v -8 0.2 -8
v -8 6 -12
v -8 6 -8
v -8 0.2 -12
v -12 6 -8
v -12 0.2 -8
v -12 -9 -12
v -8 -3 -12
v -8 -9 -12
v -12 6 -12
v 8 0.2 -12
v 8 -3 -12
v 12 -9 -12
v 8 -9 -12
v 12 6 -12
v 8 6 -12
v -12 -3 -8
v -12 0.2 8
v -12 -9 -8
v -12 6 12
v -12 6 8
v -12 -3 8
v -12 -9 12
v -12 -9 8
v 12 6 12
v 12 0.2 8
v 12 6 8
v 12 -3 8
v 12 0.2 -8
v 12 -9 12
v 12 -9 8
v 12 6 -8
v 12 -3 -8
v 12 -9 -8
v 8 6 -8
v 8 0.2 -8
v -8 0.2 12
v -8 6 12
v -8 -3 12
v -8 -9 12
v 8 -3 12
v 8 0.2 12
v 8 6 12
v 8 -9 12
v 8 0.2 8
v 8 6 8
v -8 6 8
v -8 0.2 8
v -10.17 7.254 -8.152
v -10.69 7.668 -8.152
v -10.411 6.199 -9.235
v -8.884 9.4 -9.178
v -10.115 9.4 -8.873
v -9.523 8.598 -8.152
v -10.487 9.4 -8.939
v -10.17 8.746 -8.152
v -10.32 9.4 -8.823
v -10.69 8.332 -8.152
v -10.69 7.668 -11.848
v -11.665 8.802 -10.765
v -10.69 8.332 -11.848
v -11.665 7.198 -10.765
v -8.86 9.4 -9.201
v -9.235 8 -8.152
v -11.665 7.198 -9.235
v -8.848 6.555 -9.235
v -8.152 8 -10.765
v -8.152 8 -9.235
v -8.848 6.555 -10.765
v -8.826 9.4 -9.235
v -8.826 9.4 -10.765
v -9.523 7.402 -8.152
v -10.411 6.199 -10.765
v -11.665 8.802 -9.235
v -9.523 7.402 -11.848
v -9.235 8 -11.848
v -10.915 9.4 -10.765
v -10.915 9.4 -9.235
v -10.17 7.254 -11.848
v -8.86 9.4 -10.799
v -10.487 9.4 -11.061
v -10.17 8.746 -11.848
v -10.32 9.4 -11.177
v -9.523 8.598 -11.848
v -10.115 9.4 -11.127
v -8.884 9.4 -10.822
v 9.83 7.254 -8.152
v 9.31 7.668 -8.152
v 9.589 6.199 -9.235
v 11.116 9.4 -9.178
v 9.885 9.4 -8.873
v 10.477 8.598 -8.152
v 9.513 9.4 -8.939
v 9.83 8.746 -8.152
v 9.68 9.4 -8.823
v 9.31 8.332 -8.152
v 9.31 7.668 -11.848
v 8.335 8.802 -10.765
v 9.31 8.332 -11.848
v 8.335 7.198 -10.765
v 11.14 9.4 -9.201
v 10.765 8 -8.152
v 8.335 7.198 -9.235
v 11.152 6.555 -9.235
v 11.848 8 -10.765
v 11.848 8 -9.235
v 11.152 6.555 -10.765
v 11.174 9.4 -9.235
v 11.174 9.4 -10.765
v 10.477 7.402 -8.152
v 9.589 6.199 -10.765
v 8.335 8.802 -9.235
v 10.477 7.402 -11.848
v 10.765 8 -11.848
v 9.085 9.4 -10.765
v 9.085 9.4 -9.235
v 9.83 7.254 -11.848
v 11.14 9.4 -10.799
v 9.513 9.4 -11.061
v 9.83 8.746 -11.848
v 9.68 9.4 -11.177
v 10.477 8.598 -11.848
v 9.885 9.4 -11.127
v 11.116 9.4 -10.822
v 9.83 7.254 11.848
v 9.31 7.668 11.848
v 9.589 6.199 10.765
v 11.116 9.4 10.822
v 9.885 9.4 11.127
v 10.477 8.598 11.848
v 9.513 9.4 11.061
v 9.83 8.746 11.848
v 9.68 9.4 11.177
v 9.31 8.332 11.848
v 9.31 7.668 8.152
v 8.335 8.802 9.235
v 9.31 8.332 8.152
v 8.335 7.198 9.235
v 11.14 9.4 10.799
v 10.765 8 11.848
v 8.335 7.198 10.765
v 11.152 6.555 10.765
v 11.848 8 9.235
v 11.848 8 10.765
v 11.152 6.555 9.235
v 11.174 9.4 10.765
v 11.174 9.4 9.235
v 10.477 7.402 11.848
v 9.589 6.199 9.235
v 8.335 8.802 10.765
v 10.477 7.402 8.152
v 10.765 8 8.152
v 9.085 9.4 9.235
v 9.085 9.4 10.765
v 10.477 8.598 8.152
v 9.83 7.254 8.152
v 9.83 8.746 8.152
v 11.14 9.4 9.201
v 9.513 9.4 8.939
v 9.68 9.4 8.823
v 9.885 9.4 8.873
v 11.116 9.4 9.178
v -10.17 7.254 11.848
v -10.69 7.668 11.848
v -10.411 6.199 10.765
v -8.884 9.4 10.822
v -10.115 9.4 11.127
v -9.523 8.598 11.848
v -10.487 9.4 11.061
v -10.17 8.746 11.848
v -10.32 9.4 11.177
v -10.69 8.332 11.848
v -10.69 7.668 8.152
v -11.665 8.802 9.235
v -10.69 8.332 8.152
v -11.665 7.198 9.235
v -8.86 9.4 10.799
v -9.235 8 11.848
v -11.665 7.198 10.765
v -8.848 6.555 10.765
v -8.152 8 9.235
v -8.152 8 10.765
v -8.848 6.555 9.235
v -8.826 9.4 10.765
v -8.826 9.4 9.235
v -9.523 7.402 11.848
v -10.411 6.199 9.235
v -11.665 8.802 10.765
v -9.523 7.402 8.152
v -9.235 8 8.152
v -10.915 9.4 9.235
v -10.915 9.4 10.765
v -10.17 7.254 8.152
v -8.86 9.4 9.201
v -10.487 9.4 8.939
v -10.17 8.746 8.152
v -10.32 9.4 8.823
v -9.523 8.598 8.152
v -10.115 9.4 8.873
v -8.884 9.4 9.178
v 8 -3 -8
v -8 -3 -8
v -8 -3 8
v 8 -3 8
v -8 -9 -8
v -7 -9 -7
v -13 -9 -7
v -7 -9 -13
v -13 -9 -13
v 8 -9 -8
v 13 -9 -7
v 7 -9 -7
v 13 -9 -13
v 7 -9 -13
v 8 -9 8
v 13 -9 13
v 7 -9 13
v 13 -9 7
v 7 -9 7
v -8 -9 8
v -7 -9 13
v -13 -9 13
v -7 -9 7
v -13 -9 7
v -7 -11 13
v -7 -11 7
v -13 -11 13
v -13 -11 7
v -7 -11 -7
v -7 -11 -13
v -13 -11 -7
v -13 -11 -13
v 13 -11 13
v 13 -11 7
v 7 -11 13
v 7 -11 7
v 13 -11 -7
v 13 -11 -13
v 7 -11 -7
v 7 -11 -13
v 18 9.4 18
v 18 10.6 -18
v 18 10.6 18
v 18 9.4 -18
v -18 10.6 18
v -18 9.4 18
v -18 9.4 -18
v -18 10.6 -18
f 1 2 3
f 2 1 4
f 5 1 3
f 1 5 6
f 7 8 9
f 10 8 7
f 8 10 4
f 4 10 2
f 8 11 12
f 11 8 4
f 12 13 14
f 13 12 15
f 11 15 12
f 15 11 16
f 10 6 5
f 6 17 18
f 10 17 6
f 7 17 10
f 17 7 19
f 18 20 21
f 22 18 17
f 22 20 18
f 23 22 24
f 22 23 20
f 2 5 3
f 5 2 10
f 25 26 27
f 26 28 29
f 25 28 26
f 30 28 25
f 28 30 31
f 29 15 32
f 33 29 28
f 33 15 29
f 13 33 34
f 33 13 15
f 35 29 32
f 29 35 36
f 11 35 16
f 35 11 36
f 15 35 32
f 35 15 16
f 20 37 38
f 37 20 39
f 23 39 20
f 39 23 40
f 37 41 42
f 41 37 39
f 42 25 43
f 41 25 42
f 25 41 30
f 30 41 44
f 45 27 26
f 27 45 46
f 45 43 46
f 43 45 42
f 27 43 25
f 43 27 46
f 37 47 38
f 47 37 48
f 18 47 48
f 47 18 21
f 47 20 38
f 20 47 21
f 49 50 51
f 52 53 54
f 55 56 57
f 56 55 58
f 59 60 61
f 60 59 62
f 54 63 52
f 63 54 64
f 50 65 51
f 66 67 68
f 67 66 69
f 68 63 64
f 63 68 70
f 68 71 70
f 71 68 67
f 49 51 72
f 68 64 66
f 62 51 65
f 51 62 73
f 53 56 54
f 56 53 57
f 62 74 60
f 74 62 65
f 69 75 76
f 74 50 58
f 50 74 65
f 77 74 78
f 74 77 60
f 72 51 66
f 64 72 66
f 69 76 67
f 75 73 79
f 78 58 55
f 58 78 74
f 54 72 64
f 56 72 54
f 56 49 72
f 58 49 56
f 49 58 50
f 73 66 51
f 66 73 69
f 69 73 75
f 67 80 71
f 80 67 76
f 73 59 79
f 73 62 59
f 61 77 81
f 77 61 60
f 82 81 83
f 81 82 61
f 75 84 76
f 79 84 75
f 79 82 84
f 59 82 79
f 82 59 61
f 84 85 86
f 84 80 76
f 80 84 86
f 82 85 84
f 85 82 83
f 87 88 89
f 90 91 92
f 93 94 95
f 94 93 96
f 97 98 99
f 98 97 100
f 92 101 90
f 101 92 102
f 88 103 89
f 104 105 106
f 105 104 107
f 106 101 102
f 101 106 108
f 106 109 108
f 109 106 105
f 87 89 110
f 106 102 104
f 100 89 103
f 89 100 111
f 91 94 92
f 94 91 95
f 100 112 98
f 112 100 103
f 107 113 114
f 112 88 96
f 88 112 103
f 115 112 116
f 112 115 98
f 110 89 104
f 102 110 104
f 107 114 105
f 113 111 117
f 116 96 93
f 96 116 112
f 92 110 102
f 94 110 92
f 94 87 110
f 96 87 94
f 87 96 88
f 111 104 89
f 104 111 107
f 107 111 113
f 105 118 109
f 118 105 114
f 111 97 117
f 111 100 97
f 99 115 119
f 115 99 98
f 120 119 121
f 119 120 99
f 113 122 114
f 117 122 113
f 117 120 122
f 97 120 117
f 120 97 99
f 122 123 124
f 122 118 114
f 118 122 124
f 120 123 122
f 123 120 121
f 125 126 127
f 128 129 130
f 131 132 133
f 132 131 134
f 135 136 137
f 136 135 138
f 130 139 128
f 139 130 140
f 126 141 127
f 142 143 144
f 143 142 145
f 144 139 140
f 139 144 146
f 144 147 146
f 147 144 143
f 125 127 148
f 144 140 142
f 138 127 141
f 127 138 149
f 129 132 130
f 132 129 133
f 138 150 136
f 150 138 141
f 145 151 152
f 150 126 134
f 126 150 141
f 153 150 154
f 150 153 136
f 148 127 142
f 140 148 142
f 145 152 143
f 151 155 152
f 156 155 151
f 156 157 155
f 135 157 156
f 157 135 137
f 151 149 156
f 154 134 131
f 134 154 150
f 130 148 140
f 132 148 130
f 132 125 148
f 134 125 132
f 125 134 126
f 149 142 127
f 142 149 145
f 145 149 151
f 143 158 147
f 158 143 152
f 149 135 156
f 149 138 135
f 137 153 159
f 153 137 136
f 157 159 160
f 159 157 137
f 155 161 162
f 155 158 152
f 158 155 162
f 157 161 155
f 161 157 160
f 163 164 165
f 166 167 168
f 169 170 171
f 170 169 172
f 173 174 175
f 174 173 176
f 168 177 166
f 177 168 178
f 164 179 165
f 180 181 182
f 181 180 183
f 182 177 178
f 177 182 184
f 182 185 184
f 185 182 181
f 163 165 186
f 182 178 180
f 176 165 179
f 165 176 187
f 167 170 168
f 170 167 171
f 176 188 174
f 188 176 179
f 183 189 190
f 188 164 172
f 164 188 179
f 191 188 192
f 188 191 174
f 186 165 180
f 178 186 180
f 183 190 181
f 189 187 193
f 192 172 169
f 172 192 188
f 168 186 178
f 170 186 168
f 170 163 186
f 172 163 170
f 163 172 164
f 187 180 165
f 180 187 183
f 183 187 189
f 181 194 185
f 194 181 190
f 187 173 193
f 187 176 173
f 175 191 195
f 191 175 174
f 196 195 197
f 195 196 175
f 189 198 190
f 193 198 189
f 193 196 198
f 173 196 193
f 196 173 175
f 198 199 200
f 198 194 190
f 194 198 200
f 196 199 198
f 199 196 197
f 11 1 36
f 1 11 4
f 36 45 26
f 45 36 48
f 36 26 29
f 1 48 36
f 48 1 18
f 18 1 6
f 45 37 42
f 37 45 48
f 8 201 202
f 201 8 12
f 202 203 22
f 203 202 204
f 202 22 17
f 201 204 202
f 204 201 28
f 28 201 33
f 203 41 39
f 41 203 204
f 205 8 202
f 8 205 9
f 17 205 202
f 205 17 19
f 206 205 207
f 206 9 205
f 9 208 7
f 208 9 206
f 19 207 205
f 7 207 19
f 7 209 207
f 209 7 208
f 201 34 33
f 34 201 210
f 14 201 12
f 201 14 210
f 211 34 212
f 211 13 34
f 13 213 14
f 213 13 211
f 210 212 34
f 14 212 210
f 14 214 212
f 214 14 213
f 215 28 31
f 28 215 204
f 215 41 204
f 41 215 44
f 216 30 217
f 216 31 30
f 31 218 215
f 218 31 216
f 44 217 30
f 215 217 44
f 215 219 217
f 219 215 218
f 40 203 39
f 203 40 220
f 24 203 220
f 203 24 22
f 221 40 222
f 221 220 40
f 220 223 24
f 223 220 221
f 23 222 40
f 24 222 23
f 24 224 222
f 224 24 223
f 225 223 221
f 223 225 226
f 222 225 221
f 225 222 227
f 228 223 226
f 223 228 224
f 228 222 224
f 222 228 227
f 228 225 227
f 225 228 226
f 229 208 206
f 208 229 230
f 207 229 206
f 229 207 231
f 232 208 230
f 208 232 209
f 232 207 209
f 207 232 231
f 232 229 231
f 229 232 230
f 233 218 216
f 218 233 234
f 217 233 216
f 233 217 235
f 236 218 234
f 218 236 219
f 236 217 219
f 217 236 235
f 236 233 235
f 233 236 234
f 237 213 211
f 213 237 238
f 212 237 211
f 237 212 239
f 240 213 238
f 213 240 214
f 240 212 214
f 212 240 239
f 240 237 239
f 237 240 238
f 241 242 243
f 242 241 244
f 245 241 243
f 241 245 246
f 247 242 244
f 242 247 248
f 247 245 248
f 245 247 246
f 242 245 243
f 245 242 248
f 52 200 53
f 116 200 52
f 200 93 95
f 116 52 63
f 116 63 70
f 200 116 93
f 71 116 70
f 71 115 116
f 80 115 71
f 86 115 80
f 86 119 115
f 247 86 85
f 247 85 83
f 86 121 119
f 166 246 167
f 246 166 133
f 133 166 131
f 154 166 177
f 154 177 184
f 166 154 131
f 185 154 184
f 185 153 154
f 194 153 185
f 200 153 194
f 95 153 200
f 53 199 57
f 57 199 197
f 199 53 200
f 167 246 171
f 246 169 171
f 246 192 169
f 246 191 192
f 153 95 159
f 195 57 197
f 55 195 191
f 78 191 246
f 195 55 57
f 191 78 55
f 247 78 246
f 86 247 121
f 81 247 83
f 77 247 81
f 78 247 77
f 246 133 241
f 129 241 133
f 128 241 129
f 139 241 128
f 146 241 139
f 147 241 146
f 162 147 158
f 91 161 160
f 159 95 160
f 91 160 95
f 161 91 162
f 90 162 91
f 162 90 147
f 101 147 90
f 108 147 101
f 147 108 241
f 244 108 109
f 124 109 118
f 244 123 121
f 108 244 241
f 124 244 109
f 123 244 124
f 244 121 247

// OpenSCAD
translate([-12,0,-12])//we can use negative values only in translate function not in other like cube or sphere.

cube([4,6,4]);
translate([8,0,-12])
cube([4,6,4]);
translate([8,0,8])
cube([4,6,4]);
translate([-12,0,8])
cube([4,6,4]);
//Now we are adding spheres on top 

translate([-10,8,-10])
sphere(2);//sphere with radious 2
translate([10,8,-10])
sphere(2);
translate([10,8,10])
sphere(2);
translate([-10,8,10])
sphere(2);
//Now we are adding middle base for table pillers
translate([-12,-3,-12])
scale([3,0.4,3])
cube(8,0,12);
//now final pillars or base pillars
translate([-12,-9,-12])
 cube([4,6,4]);
translate([8,-9,-12])
cube([4,6,4]);
translate([8,-9,8])
cube([4,6,4]);
translate([-12,-9,8])
cube([4,6,4]);
//steps(paudian ;D

translate([-13,-11,7])
cube([6,2,6]);
translate([-13,-11,-13])
cube([6,2,6]);
translate([7,-11,7])
cube([6,2,6]);
translate([7,-11,-13])
cube([6,2,6]);
//upper base(sheesha)

translate([0,10,0])
scale([3,0.1,3])
cube(12,0,12,center=true);
